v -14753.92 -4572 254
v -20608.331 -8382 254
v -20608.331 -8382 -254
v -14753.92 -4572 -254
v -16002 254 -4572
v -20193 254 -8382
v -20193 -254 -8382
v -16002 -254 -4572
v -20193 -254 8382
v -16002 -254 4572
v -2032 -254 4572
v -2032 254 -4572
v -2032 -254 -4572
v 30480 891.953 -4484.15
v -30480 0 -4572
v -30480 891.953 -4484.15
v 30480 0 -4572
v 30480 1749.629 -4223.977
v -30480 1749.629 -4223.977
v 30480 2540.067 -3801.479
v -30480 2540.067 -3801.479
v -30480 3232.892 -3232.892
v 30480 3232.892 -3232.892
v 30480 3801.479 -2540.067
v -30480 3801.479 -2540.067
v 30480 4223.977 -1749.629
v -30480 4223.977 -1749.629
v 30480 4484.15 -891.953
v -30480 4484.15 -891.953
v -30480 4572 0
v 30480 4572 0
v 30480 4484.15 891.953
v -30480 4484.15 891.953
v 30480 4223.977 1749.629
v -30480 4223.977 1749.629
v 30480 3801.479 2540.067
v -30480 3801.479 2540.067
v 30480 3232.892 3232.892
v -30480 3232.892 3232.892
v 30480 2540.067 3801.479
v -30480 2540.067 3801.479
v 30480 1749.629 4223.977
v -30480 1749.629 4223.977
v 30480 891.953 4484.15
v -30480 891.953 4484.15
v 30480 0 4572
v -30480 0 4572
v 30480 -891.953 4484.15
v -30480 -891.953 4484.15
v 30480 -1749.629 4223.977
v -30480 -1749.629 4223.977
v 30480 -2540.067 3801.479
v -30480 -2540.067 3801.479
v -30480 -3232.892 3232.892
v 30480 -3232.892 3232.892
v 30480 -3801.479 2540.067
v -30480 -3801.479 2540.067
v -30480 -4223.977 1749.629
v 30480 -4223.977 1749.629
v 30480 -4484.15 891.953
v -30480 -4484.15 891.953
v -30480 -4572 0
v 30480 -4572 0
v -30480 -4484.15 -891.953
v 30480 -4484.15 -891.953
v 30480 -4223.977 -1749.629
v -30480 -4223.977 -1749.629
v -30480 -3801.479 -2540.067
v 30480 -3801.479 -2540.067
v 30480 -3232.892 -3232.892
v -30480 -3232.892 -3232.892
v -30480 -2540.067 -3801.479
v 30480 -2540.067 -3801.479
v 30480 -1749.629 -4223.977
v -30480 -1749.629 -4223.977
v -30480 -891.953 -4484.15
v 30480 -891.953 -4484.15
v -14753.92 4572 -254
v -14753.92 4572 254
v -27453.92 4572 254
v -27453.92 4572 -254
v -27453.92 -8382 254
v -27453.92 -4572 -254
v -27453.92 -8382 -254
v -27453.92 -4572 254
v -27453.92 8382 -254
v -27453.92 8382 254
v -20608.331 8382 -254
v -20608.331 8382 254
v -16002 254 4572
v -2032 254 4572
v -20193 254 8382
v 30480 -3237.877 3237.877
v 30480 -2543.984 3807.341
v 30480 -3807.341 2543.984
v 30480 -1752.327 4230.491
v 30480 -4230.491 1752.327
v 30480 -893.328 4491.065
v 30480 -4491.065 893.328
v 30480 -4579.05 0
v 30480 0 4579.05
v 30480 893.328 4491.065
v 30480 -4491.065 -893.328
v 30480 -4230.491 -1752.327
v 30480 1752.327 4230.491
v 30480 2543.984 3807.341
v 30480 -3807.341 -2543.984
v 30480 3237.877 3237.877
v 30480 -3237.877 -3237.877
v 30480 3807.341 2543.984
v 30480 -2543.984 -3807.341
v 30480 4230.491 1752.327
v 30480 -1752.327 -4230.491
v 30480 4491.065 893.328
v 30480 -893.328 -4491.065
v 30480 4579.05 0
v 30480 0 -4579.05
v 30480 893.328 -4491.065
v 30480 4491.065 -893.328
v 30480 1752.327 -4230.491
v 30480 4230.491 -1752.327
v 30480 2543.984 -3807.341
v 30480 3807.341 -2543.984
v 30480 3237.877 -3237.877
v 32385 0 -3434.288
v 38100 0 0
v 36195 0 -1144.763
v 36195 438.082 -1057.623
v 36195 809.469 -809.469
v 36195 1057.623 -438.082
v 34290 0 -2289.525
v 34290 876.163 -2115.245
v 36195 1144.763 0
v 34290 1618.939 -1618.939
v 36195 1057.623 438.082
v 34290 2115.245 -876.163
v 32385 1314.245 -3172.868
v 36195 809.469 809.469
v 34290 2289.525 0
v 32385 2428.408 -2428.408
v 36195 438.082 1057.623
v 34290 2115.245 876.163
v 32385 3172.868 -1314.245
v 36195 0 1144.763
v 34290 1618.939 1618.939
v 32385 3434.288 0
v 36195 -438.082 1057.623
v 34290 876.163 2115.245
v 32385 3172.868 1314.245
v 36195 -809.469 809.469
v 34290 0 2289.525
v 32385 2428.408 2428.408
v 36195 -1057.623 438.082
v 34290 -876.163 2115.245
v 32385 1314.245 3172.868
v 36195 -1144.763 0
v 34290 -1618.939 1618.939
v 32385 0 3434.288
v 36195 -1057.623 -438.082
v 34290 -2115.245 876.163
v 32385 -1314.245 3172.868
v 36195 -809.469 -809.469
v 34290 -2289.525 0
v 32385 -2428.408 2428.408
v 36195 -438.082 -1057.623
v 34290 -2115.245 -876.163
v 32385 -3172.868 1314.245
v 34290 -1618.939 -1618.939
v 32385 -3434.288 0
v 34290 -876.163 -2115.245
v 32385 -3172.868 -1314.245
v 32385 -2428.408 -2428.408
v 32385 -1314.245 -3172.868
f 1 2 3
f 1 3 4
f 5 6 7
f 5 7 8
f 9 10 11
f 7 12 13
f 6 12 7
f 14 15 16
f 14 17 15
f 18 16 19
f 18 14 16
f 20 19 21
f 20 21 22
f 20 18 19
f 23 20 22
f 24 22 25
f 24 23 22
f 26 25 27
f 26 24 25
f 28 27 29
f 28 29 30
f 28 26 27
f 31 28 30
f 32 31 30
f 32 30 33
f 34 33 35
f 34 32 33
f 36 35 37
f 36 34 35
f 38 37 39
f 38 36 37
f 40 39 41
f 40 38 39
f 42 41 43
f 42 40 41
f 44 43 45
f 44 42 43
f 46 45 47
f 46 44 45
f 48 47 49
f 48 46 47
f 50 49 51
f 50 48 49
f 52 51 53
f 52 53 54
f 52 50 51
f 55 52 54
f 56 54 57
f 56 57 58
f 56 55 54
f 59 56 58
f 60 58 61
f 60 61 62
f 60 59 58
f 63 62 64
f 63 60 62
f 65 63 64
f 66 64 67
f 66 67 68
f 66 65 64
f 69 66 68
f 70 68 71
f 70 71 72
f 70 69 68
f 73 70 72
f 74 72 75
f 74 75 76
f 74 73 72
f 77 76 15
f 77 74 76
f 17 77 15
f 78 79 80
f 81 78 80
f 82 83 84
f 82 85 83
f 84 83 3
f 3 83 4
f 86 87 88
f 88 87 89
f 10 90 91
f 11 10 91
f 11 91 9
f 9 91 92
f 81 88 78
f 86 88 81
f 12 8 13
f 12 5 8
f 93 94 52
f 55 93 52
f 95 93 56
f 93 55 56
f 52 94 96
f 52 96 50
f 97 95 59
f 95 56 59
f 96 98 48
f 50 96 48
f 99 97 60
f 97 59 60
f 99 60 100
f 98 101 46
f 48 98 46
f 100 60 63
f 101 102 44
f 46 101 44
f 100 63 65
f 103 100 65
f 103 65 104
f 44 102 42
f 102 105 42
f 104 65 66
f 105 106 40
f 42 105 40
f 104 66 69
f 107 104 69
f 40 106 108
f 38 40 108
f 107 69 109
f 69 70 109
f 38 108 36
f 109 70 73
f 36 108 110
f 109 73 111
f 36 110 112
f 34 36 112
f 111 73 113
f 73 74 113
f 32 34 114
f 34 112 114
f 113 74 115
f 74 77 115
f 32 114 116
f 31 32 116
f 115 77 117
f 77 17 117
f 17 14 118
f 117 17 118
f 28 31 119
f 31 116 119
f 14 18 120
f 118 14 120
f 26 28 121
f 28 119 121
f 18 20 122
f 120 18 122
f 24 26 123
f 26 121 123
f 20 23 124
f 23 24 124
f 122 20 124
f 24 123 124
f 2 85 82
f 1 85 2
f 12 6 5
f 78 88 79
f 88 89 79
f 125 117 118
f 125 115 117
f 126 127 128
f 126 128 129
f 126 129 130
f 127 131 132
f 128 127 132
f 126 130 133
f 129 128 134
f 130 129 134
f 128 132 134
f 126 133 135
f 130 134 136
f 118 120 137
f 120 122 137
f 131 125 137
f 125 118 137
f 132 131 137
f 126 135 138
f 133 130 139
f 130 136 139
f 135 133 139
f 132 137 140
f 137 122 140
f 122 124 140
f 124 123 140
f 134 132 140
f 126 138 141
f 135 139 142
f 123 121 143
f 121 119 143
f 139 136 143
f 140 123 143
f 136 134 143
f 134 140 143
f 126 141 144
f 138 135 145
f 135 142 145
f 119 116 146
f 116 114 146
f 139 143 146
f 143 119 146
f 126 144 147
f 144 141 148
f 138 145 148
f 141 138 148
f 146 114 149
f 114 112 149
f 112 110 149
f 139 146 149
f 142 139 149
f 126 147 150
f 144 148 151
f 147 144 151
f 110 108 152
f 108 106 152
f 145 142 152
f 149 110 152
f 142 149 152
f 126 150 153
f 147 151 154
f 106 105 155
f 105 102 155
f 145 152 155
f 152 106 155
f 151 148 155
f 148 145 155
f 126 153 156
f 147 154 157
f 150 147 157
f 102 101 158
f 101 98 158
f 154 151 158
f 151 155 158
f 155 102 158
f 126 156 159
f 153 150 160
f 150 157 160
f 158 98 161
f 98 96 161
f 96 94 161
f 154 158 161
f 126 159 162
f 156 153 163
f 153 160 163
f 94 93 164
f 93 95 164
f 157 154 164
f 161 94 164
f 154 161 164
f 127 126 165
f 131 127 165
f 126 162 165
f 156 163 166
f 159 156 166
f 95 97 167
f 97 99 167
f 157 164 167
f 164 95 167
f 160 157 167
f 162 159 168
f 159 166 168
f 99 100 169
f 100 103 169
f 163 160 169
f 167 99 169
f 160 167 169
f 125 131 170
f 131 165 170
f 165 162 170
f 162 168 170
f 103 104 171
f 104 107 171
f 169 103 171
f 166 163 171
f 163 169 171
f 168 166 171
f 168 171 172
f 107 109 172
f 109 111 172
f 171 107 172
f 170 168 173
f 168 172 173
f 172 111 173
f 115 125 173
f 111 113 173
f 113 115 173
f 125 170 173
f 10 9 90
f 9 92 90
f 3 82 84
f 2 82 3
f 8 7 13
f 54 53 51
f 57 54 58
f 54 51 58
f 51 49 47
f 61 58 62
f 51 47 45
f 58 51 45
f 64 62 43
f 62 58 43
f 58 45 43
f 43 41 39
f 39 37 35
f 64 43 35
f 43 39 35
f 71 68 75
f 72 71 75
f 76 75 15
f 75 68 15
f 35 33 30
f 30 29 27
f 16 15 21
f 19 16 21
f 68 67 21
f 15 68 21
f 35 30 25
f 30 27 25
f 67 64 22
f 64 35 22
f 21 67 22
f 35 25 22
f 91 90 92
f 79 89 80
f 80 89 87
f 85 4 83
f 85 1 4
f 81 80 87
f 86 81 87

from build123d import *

# Parameters (mm, degrees)
BOSS_EXTRUDE1_DEPTH        = 30480
BOSS_EXTRUDE1_DEPTH_BACK   = 30480
SKETCH1_R                  = 4572
BOSS_EXTRUDE2_DEPTH        = 254
BOSS_EXTRUDE2_DEPTH_BACK   = 254
BOSS_EXTRUDE2_2_DEPTH      = 254
BOSS_EXTRUDE2_2_DEPTH_BACK = 254
BOSS_EXTRUDE3_DEPTH        = 254
BOSS_EXTRUDE3_DEPTH_BACK   = 254
BOSS_EXTRUDE3_2_DEPTH      = 254
BOSS_EXTRUDE3_2_DEPTH_BACK = 254


with BuildPart() as part:
    # Sketch1 → Boss-Extrude1 (new, two sides: drawn at the far end of the back side and taken through both)
    with BuildSketch(Plane(origin=(0, 0, 0), x_dir=(0, 0, -1), z_dir=(1, 0, 0)).offset(-BOSS_EXTRUDE1_DEPTH_BACK)):
        Circle(SKETCH1_R)
    extrude(amount=BOSS_EXTRUDE1_DEPTH + BOSS_EXTRUDE1_DEPTH_BACK)

    # Sketch3 → Revolve1 (revolve)
    with BuildSketch(Plane(origin=(0, 0, 0), x_dir=(1, 0, 0), z_dir=(0, 1, 0))):
        Polygon((30480, 0), (38100, 0), (30480, 4579.050119839), align=None)
    revolve(axis=Axis((30480, 0, 0), (1, 0, 0)))


with BuildPart() as body_2:
    # Sketch4 → Boss-Extrude2 (new, two sides: drawn at the far end of the back side and taken through both)
    with BuildSketch(Plane.XY.offset(-BOSS_EXTRUDE2_DEPTH_BACK)):
        Polygon((-27453.919833627, 4572), (-27453.919833627, 8382), (-20608.330564008, 8382), (-14753.919833627, 4572), align=None)
    extrude(amount=BOSS_EXTRUDE2_DEPTH + BOSS_EXTRUDE2_DEPTH_BACK)


with BuildPart() as body_3:
    # Sketch4 → Boss-Extrude2 2 (new, two sides: drawn at the far end of the back side and taken through both)
    with BuildSketch(Plane.XY.offset(-BOSS_EXTRUDE2_2_DEPTH_BACK)):
        Polygon((-27453.919833627, -4572), (-27453.919833627, -8382), (-20608.330564008, -8382), (-14753.919833627, -4572), align=None)
    extrude(amount=BOSS_EXTRUDE2_2_DEPTH + BOSS_EXTRUDE2_2_DEPTH_BACK)


with BuildPart() as body_4:
    # Sketch5 → Boss-Extrude3 (new, two sides: drawn at the far end of the back side and taken through both)
    with BuildSketch(Plane(origin=(0, 0, 0), x_dir=(1, 0, 0), z_dir=(0, 1, 0)).offset(-BOSS_EXTRUDE3_DEPTH_BACK)):
        Polygon((-2032, 4572), (-20193, 8382), (-16002, 4572), align=None)
    extrude(amount=BOSS_EXTRUDE3_DEPTH + BOSS_EXTRUDE3_DEPTH_BACK)


with BuildPart() as body_5:
    # Sketch5 → Boss-Extrude3 2 (new, two sides: drawn at the far end of the back side and taken through both)
    with BuildSketch(Plane(origin=(0, 0, 0), x_dir=(1, 0, 0), z_dir=(0, 1, 0)).offset(-BOSS_EXTRUDE3_2_DEPTH_BACK)):
        Polygon((-2032, -4572), (-20193, -8382), (-16002, -4572), align=None)
    extrude(amount=BOSS_EXTRUDE3_2_DEPTH + BOSS_EXTRUDE3_2_DEPTH_BACK)


solid = Compound([part.part, body_2.part, body_3.part, body_4.part, body_5.part])
